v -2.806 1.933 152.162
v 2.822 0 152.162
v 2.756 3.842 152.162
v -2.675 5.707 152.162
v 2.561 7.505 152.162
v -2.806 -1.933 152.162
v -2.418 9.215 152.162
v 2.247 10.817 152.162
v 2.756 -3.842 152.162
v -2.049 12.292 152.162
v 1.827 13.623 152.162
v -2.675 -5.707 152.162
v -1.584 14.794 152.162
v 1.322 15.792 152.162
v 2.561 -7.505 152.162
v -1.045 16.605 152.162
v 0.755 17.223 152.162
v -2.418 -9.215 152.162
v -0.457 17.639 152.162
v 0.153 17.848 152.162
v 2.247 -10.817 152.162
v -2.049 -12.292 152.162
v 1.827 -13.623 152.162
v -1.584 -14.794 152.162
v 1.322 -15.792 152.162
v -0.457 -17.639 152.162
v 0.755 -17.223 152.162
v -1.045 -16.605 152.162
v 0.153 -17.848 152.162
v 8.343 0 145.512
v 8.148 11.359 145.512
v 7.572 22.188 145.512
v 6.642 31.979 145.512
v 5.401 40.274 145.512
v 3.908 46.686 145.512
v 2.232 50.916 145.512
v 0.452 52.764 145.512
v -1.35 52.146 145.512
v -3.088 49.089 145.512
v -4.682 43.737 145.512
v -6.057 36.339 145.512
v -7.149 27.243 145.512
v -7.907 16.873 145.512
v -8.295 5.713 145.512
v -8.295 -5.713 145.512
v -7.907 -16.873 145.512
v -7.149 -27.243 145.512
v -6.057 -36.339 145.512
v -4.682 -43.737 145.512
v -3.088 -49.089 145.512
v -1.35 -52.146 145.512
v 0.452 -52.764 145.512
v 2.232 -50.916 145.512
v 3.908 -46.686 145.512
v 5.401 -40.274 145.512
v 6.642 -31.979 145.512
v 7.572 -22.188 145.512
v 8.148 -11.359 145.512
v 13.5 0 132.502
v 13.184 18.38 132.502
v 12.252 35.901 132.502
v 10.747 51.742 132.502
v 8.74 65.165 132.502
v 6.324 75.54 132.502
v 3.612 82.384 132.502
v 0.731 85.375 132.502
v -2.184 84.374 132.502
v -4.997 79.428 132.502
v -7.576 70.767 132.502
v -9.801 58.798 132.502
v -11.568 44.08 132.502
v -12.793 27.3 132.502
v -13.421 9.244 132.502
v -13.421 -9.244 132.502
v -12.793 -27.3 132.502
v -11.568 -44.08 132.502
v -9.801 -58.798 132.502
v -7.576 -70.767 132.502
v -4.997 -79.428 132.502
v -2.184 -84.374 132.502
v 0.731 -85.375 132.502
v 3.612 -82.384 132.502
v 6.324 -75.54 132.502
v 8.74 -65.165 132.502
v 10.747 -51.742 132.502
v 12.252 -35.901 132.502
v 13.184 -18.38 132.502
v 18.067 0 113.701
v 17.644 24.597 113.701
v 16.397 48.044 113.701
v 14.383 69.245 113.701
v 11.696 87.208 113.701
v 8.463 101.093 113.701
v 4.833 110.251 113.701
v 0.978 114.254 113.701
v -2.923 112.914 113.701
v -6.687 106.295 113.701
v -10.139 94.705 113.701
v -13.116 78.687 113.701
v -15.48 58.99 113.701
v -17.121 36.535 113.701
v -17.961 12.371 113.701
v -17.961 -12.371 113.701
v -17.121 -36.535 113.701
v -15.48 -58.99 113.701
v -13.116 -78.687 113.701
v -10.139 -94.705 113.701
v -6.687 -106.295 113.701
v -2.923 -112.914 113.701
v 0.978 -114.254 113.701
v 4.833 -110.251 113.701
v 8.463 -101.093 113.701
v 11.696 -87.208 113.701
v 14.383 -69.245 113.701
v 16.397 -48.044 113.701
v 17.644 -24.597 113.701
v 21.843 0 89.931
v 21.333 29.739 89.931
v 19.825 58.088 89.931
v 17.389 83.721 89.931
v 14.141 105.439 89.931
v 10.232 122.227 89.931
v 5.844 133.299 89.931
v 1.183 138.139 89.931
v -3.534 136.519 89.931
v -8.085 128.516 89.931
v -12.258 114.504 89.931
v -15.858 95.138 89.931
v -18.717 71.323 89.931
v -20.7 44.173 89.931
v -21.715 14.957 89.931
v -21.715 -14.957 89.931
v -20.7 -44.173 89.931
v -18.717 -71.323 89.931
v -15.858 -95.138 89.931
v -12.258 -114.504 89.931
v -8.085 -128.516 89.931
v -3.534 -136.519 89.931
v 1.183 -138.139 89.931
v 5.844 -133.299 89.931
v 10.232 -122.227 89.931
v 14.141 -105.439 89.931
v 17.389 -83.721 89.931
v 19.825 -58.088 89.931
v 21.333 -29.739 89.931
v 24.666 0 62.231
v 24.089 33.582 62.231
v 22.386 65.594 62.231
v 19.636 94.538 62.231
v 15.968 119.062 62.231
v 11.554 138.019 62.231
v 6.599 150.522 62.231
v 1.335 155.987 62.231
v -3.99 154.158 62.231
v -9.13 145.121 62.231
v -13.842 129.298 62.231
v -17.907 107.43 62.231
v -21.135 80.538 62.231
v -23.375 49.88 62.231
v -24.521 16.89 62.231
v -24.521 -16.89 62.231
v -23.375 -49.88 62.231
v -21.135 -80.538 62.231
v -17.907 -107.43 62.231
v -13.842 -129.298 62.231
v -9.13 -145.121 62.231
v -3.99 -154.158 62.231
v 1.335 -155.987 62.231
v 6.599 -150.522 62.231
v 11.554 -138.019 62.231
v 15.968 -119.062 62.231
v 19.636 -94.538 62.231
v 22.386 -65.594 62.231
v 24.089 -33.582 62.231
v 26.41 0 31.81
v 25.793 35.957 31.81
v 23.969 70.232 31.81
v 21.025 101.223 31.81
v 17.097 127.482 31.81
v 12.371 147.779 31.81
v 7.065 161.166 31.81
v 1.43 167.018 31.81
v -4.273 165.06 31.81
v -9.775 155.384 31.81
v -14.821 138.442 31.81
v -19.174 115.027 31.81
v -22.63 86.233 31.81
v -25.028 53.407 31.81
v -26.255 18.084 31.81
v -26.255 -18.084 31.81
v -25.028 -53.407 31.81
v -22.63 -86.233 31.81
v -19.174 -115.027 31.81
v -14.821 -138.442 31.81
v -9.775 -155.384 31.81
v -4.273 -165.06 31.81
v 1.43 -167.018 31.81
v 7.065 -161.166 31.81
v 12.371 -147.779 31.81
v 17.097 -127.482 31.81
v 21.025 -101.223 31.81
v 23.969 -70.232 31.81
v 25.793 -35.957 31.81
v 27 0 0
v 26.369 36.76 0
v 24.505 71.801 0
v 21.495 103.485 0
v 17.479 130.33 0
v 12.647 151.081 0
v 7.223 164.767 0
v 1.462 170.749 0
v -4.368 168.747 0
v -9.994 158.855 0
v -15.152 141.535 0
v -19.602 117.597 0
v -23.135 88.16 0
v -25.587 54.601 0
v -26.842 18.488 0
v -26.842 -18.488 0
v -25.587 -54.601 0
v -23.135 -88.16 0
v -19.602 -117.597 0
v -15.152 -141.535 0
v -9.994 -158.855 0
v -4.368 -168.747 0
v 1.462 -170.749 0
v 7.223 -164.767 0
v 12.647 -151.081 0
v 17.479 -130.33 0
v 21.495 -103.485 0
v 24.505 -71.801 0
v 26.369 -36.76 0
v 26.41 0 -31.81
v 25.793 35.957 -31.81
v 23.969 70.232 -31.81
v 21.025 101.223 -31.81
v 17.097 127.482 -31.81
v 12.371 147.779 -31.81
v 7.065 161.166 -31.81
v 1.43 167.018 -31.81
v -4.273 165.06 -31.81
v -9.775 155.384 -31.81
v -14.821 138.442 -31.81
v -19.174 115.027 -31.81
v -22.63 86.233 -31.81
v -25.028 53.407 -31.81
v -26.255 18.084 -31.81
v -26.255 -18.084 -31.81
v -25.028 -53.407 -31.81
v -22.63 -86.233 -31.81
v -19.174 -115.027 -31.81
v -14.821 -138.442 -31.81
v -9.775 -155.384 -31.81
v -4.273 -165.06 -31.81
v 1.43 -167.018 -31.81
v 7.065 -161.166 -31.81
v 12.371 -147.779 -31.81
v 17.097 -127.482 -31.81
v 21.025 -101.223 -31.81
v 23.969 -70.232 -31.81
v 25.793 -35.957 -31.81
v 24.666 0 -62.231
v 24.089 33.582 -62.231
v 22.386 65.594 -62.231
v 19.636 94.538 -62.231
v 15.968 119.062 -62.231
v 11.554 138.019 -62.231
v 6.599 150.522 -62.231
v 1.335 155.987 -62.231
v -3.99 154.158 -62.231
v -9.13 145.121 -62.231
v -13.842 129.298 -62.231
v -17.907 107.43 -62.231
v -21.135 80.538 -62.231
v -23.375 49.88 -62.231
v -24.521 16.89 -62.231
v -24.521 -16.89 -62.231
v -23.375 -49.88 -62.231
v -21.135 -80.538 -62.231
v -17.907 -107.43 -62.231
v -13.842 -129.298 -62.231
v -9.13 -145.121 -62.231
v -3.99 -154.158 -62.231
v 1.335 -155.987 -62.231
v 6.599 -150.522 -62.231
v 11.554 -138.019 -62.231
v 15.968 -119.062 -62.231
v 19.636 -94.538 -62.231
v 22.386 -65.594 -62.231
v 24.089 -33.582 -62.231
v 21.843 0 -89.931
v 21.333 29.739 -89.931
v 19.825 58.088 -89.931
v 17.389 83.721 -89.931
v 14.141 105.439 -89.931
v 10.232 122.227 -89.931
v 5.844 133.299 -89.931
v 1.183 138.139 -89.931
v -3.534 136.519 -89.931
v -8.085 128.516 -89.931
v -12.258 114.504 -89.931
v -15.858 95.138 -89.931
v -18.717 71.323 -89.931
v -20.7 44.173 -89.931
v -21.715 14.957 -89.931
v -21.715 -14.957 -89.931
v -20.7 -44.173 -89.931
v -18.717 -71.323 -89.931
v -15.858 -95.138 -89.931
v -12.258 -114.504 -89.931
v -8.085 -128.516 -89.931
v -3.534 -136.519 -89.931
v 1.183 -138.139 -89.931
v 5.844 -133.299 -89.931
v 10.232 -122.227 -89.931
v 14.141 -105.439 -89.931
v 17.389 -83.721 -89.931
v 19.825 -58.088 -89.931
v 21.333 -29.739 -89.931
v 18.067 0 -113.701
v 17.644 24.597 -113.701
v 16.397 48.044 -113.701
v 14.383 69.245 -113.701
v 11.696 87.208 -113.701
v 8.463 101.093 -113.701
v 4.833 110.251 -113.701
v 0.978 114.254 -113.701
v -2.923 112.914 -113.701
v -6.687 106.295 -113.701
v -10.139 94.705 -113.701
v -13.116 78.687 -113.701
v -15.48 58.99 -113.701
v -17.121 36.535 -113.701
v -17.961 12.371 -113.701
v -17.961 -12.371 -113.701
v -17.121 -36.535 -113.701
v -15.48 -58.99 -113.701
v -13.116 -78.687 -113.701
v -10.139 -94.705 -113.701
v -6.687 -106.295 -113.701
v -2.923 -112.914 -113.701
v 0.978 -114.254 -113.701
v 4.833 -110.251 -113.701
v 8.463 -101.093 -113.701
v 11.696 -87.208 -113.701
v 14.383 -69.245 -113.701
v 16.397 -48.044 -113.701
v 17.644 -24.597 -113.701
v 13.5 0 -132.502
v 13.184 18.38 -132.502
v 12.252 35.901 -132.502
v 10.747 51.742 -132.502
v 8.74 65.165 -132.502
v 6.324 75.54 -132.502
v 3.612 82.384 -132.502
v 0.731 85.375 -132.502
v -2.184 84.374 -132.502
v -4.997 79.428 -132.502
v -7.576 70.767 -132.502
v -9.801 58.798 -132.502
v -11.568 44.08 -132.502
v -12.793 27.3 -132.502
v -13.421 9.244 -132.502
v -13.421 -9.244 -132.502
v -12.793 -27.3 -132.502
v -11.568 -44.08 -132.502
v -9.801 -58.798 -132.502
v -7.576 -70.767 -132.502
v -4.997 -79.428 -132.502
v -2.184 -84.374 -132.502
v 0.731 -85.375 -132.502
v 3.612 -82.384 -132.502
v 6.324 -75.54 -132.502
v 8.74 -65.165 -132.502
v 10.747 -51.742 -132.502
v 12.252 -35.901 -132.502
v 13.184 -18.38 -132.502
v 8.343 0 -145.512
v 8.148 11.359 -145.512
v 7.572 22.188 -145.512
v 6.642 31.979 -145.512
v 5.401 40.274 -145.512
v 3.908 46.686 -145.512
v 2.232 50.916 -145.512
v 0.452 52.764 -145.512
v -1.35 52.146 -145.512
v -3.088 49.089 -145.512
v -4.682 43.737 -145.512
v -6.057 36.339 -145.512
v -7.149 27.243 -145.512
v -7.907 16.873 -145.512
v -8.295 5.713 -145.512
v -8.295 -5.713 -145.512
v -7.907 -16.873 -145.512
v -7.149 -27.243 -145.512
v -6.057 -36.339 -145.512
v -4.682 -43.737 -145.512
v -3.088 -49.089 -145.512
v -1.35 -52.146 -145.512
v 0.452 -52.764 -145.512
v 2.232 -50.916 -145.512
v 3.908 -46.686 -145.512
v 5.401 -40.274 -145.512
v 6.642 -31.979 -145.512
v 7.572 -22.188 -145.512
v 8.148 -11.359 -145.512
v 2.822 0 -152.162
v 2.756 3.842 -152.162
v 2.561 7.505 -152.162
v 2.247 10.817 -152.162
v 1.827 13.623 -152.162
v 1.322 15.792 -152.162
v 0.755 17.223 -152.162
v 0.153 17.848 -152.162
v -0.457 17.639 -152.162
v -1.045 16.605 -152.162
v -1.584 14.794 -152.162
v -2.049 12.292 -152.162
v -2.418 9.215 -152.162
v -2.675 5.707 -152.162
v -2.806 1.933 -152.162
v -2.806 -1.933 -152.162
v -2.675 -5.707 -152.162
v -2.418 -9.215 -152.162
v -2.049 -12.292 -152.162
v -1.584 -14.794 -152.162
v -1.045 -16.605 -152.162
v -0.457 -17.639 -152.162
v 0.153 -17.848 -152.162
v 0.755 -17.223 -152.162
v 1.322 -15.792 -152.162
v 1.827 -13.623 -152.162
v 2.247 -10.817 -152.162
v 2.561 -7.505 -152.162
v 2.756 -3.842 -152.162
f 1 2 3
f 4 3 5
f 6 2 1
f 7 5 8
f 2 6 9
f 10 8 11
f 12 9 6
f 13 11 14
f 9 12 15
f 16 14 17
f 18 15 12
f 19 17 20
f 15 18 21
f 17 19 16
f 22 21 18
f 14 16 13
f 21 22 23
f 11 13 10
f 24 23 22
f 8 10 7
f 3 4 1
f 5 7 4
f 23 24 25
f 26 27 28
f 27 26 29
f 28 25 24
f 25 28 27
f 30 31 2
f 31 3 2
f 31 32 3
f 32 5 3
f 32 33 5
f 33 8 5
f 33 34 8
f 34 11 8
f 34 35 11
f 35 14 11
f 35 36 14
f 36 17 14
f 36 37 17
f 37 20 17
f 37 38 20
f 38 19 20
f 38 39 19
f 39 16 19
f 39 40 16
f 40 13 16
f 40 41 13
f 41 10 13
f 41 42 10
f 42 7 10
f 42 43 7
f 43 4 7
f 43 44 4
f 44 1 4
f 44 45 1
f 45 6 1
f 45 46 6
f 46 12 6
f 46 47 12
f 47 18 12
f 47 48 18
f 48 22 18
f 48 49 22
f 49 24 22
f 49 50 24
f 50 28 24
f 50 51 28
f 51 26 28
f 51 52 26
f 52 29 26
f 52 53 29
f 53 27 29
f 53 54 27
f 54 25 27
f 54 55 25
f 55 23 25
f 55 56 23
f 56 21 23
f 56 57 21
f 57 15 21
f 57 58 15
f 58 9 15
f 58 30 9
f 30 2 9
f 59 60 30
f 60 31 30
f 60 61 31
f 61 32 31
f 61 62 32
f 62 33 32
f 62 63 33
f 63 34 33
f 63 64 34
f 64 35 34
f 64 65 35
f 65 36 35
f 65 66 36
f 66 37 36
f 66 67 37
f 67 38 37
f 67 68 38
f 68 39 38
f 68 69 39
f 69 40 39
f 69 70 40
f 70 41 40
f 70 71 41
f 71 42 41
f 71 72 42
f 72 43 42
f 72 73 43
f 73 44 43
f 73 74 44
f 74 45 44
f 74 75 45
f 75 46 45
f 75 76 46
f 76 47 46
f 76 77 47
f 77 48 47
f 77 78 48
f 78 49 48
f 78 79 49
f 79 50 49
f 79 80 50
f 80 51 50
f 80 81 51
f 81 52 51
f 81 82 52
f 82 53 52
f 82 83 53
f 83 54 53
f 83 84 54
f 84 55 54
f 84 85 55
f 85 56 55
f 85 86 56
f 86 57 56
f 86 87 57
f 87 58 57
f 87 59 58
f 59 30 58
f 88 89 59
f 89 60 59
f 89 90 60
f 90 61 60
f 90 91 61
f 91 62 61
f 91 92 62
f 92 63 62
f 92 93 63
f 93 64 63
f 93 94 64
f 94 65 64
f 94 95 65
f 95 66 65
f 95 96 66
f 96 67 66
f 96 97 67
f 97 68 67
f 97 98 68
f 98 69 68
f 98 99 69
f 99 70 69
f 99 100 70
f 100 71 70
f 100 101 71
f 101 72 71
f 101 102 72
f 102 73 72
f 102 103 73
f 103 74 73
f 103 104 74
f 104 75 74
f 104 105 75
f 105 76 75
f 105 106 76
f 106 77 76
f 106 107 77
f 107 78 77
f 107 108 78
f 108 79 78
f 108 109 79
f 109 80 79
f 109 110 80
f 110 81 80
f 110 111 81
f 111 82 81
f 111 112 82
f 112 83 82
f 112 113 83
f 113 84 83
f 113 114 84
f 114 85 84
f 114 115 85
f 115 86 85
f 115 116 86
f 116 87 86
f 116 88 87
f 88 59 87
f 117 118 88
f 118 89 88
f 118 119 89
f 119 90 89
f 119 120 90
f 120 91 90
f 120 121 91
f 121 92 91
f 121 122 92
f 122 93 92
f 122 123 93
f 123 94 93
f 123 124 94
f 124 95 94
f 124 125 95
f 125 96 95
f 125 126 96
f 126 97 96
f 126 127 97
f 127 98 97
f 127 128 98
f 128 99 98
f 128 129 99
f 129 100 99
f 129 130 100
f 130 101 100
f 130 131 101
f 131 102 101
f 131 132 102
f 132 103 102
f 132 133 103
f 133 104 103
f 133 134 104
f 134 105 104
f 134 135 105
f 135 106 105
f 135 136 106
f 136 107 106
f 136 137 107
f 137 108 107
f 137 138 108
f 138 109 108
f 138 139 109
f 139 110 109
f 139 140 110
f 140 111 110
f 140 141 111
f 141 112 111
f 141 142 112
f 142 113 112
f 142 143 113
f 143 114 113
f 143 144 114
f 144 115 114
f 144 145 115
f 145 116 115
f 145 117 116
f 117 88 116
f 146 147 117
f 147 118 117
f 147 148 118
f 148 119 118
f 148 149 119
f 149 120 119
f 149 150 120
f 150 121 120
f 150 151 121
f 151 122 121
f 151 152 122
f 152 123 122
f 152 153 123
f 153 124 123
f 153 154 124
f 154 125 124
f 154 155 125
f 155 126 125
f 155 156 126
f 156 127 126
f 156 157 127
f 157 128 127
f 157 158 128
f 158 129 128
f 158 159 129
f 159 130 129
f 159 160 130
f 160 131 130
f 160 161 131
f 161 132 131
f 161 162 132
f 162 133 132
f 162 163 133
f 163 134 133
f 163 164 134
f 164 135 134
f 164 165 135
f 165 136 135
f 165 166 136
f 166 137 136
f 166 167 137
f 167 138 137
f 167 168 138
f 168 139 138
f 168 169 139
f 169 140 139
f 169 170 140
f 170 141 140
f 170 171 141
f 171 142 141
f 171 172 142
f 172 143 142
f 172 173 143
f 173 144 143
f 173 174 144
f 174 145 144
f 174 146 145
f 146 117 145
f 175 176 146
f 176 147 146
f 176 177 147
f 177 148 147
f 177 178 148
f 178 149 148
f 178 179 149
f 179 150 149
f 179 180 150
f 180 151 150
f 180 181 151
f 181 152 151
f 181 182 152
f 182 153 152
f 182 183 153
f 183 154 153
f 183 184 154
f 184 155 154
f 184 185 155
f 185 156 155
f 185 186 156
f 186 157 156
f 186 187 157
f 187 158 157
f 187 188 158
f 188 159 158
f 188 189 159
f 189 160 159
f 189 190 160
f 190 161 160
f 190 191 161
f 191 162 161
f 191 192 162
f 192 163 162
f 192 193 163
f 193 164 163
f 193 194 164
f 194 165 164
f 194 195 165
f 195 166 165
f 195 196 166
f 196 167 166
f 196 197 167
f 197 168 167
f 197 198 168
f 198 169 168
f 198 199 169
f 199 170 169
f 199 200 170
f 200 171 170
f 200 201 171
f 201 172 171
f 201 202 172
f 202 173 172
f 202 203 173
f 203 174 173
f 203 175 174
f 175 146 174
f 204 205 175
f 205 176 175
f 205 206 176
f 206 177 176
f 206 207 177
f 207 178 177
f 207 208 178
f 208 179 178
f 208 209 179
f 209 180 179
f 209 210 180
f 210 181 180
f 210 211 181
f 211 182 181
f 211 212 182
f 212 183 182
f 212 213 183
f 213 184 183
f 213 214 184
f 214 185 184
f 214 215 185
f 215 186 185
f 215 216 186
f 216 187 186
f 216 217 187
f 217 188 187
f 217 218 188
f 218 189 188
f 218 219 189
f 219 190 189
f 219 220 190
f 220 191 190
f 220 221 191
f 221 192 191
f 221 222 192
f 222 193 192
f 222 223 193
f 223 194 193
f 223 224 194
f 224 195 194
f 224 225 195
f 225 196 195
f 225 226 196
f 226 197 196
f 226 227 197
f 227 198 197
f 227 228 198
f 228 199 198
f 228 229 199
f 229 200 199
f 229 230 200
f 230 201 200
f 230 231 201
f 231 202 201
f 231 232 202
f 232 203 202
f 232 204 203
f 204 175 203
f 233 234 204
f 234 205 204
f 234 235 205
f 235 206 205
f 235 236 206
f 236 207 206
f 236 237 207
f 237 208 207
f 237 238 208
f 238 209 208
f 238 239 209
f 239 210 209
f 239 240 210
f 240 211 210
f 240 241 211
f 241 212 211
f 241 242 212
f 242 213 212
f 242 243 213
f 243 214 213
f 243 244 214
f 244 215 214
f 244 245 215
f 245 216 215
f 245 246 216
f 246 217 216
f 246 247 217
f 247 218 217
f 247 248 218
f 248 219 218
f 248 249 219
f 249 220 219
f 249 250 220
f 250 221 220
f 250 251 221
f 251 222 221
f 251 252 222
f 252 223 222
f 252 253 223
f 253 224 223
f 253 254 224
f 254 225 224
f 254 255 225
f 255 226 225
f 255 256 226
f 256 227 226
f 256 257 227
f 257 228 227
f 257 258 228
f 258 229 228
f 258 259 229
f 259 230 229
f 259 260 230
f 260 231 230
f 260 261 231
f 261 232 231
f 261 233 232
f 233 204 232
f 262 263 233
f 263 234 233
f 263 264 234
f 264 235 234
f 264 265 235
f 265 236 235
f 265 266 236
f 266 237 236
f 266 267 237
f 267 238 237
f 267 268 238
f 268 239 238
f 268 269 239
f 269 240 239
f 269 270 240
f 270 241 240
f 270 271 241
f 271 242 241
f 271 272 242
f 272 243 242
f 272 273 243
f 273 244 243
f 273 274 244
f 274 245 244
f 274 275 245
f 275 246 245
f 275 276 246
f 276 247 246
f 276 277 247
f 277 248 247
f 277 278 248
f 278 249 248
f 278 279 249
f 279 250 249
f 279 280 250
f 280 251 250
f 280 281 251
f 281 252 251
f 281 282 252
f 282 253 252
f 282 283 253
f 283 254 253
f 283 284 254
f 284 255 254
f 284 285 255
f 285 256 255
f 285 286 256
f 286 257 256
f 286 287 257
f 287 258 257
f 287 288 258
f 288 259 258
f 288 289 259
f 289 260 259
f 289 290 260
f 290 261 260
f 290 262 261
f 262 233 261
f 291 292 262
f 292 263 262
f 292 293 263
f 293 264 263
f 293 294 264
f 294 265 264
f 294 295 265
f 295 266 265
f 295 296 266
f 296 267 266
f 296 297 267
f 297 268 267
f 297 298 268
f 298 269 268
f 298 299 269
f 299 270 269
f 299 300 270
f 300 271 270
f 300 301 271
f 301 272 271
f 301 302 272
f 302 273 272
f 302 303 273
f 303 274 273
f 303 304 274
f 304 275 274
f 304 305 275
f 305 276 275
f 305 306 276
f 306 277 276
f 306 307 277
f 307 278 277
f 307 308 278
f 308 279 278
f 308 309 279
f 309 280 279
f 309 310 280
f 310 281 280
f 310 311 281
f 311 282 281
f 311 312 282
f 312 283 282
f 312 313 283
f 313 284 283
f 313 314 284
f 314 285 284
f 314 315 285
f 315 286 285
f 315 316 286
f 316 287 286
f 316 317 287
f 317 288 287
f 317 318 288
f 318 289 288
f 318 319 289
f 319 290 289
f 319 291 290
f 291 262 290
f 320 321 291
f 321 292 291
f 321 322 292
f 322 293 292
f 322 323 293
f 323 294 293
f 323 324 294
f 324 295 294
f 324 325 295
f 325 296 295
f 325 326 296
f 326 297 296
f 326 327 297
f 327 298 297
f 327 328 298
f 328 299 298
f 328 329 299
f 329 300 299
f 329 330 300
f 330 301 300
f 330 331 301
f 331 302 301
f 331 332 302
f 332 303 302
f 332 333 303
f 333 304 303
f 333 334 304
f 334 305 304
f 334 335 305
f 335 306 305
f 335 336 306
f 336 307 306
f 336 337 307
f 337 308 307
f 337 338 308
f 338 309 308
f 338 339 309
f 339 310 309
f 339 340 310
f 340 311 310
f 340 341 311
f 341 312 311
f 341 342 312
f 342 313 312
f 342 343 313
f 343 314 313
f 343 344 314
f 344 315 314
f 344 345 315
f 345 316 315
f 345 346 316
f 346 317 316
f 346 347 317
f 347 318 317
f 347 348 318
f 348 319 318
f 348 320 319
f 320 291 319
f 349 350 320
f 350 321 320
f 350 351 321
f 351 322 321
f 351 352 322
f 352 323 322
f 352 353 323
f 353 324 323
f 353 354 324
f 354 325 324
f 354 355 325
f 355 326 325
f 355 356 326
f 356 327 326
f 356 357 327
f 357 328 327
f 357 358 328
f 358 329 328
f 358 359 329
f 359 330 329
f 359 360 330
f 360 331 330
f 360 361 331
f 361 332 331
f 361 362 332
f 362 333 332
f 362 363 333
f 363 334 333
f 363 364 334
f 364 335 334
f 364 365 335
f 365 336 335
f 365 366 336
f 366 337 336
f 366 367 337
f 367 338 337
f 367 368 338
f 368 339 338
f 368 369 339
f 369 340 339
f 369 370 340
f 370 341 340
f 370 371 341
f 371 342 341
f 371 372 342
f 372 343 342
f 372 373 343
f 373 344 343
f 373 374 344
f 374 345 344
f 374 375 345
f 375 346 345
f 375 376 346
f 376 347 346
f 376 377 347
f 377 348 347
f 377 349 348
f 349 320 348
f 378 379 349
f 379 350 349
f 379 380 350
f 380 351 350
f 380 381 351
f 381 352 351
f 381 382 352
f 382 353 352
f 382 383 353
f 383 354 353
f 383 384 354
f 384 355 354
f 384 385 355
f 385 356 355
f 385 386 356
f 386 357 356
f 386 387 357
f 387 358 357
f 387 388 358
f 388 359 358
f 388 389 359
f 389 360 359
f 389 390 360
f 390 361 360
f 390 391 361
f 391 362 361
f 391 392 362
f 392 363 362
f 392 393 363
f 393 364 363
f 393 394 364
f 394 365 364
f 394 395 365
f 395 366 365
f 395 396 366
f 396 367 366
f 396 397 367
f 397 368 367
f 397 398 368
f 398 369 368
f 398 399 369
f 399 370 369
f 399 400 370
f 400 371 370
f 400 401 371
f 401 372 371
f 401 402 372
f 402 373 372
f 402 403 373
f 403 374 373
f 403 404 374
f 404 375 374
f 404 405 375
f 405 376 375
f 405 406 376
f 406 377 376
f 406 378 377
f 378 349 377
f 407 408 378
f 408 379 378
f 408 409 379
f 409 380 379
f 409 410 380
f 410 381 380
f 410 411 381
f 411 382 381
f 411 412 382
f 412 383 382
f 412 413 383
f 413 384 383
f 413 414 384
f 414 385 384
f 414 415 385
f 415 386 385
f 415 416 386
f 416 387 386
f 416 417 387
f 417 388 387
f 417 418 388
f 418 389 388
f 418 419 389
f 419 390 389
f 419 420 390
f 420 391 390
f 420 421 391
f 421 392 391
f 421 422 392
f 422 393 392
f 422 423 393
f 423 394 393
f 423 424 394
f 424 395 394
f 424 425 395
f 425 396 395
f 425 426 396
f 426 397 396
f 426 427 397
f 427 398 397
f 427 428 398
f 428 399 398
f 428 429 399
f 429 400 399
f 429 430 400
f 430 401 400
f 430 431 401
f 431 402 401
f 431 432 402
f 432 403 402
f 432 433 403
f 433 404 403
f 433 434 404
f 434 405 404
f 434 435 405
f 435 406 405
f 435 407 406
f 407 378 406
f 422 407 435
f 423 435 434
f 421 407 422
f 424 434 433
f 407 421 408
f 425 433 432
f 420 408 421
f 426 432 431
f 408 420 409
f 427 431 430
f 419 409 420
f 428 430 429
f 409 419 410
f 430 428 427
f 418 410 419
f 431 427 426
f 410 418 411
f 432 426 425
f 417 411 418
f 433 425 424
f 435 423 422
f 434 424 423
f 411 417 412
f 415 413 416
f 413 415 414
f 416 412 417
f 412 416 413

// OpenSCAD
// Generated by SolidPython 1.0.1 on 2020-07-29 00:46:46


scale(v = [3, 19, 17]) {
	sphere(r = 9);
}
/***********************************************
*********      SolidPython code:      **********
************************************************
 
# import packages: SolidPython
from solid import *
from solid.utils import *
from itertools import chain, combinations, permutations


class Resize:

    def __init__(self, scad_file):
        self.scad_file = scad_file
        #self.scad_file = import_scad(scad_file)
        # cone/cylinder param:
        self.r1 = 0
        self.r2 = 0
        self.h = 0
        # rectangular prism param:
        self.w = 0
        self.l = 0
        # ellipse param:
        self.r = 0

    # import OpenScad code (file name corresponds to shape)


    # classify shape + parameters
    def assign(self, param1, param2, param3):
        if self.scad_file == 'cone.scad':
            self.r1 = param1
            self.r2 = param2
            self.h = param3
        elif self.scad_file == 'cylinder.scad':
            self.r1 = param1
            self.r2 = param2
            self.h = param3
        elif self.scad_file == 'rectangularPrism.scad':
            self.h = param1
            self.l = param2
            self.w = param3
        else:
            self.r = param1
            self.h = param2

    # resize parameters
    def iterate(self):
        x = range(3, 20, 2)
        i = 1
        if self.scad_file == 'cone.scad':
            tempList = list(permutations(x, 2))
            for temp in tempList:
                param1 = temp[0]
                param2 = temp[1]
                filepath = 'produced_scad_files/' + 'cone' + str(param1) + '_' + str(param2) + '_' + '.scad'
                scad_render_to_file(cylinder(h=param1, r1=param2, r2=0), filepath)

        elif self.scad_file == 'cylinder.scad':
            tempList = list(permutations(x, 3))
            for temp in tempList:
                param1 = temp[0]
                param2 = temp[1]
                filepath = 'produced_scad_files/' + 'cylinder' + str(param1) + '_' + str(param2) + '_' + '.scad'
                scad_render_to_file(cylinder(h=param1, r1=param2, r2=param2), filepath)

        elif self.scad_file == 'rectangularPrism.scad':
            tempList = list(permutations(x, 3))
            for temp in tempList:
                param1 = temp[0]
                param2 = temp[1]
                param3 = temp[2]
                filepath = 'produced_scad_files/' + 'rectangularPrism' + str(param1) + '_' + str(param2) + '_' + str(
                    param3) + '.scad'
                scad_render_to_file(cube(size=(param1, param2, param3)), filepath)

        elif self.scad_file == 'ellipse.scad':
            tempList = list(permutations(x, 4))
            for temp in tempList:
                param1 = temp[0]
                param2 = temp[1]
                param3 = temp[2]
                param4 = temp[3]
                filepath = 'produced_scad_files/' + 'ellipse' + str(param1) + '_' + str(param2) + '_' + str(param3) + '_' + str(param4) + '.scad'
                scad_render_to_file(scale([param1, param2, param3])(sphere(r=param4)), filepath)

    def render_to_scadfile(self):
        scad_render_to_file(scad, 'example.scad') 
 
************************************************/
